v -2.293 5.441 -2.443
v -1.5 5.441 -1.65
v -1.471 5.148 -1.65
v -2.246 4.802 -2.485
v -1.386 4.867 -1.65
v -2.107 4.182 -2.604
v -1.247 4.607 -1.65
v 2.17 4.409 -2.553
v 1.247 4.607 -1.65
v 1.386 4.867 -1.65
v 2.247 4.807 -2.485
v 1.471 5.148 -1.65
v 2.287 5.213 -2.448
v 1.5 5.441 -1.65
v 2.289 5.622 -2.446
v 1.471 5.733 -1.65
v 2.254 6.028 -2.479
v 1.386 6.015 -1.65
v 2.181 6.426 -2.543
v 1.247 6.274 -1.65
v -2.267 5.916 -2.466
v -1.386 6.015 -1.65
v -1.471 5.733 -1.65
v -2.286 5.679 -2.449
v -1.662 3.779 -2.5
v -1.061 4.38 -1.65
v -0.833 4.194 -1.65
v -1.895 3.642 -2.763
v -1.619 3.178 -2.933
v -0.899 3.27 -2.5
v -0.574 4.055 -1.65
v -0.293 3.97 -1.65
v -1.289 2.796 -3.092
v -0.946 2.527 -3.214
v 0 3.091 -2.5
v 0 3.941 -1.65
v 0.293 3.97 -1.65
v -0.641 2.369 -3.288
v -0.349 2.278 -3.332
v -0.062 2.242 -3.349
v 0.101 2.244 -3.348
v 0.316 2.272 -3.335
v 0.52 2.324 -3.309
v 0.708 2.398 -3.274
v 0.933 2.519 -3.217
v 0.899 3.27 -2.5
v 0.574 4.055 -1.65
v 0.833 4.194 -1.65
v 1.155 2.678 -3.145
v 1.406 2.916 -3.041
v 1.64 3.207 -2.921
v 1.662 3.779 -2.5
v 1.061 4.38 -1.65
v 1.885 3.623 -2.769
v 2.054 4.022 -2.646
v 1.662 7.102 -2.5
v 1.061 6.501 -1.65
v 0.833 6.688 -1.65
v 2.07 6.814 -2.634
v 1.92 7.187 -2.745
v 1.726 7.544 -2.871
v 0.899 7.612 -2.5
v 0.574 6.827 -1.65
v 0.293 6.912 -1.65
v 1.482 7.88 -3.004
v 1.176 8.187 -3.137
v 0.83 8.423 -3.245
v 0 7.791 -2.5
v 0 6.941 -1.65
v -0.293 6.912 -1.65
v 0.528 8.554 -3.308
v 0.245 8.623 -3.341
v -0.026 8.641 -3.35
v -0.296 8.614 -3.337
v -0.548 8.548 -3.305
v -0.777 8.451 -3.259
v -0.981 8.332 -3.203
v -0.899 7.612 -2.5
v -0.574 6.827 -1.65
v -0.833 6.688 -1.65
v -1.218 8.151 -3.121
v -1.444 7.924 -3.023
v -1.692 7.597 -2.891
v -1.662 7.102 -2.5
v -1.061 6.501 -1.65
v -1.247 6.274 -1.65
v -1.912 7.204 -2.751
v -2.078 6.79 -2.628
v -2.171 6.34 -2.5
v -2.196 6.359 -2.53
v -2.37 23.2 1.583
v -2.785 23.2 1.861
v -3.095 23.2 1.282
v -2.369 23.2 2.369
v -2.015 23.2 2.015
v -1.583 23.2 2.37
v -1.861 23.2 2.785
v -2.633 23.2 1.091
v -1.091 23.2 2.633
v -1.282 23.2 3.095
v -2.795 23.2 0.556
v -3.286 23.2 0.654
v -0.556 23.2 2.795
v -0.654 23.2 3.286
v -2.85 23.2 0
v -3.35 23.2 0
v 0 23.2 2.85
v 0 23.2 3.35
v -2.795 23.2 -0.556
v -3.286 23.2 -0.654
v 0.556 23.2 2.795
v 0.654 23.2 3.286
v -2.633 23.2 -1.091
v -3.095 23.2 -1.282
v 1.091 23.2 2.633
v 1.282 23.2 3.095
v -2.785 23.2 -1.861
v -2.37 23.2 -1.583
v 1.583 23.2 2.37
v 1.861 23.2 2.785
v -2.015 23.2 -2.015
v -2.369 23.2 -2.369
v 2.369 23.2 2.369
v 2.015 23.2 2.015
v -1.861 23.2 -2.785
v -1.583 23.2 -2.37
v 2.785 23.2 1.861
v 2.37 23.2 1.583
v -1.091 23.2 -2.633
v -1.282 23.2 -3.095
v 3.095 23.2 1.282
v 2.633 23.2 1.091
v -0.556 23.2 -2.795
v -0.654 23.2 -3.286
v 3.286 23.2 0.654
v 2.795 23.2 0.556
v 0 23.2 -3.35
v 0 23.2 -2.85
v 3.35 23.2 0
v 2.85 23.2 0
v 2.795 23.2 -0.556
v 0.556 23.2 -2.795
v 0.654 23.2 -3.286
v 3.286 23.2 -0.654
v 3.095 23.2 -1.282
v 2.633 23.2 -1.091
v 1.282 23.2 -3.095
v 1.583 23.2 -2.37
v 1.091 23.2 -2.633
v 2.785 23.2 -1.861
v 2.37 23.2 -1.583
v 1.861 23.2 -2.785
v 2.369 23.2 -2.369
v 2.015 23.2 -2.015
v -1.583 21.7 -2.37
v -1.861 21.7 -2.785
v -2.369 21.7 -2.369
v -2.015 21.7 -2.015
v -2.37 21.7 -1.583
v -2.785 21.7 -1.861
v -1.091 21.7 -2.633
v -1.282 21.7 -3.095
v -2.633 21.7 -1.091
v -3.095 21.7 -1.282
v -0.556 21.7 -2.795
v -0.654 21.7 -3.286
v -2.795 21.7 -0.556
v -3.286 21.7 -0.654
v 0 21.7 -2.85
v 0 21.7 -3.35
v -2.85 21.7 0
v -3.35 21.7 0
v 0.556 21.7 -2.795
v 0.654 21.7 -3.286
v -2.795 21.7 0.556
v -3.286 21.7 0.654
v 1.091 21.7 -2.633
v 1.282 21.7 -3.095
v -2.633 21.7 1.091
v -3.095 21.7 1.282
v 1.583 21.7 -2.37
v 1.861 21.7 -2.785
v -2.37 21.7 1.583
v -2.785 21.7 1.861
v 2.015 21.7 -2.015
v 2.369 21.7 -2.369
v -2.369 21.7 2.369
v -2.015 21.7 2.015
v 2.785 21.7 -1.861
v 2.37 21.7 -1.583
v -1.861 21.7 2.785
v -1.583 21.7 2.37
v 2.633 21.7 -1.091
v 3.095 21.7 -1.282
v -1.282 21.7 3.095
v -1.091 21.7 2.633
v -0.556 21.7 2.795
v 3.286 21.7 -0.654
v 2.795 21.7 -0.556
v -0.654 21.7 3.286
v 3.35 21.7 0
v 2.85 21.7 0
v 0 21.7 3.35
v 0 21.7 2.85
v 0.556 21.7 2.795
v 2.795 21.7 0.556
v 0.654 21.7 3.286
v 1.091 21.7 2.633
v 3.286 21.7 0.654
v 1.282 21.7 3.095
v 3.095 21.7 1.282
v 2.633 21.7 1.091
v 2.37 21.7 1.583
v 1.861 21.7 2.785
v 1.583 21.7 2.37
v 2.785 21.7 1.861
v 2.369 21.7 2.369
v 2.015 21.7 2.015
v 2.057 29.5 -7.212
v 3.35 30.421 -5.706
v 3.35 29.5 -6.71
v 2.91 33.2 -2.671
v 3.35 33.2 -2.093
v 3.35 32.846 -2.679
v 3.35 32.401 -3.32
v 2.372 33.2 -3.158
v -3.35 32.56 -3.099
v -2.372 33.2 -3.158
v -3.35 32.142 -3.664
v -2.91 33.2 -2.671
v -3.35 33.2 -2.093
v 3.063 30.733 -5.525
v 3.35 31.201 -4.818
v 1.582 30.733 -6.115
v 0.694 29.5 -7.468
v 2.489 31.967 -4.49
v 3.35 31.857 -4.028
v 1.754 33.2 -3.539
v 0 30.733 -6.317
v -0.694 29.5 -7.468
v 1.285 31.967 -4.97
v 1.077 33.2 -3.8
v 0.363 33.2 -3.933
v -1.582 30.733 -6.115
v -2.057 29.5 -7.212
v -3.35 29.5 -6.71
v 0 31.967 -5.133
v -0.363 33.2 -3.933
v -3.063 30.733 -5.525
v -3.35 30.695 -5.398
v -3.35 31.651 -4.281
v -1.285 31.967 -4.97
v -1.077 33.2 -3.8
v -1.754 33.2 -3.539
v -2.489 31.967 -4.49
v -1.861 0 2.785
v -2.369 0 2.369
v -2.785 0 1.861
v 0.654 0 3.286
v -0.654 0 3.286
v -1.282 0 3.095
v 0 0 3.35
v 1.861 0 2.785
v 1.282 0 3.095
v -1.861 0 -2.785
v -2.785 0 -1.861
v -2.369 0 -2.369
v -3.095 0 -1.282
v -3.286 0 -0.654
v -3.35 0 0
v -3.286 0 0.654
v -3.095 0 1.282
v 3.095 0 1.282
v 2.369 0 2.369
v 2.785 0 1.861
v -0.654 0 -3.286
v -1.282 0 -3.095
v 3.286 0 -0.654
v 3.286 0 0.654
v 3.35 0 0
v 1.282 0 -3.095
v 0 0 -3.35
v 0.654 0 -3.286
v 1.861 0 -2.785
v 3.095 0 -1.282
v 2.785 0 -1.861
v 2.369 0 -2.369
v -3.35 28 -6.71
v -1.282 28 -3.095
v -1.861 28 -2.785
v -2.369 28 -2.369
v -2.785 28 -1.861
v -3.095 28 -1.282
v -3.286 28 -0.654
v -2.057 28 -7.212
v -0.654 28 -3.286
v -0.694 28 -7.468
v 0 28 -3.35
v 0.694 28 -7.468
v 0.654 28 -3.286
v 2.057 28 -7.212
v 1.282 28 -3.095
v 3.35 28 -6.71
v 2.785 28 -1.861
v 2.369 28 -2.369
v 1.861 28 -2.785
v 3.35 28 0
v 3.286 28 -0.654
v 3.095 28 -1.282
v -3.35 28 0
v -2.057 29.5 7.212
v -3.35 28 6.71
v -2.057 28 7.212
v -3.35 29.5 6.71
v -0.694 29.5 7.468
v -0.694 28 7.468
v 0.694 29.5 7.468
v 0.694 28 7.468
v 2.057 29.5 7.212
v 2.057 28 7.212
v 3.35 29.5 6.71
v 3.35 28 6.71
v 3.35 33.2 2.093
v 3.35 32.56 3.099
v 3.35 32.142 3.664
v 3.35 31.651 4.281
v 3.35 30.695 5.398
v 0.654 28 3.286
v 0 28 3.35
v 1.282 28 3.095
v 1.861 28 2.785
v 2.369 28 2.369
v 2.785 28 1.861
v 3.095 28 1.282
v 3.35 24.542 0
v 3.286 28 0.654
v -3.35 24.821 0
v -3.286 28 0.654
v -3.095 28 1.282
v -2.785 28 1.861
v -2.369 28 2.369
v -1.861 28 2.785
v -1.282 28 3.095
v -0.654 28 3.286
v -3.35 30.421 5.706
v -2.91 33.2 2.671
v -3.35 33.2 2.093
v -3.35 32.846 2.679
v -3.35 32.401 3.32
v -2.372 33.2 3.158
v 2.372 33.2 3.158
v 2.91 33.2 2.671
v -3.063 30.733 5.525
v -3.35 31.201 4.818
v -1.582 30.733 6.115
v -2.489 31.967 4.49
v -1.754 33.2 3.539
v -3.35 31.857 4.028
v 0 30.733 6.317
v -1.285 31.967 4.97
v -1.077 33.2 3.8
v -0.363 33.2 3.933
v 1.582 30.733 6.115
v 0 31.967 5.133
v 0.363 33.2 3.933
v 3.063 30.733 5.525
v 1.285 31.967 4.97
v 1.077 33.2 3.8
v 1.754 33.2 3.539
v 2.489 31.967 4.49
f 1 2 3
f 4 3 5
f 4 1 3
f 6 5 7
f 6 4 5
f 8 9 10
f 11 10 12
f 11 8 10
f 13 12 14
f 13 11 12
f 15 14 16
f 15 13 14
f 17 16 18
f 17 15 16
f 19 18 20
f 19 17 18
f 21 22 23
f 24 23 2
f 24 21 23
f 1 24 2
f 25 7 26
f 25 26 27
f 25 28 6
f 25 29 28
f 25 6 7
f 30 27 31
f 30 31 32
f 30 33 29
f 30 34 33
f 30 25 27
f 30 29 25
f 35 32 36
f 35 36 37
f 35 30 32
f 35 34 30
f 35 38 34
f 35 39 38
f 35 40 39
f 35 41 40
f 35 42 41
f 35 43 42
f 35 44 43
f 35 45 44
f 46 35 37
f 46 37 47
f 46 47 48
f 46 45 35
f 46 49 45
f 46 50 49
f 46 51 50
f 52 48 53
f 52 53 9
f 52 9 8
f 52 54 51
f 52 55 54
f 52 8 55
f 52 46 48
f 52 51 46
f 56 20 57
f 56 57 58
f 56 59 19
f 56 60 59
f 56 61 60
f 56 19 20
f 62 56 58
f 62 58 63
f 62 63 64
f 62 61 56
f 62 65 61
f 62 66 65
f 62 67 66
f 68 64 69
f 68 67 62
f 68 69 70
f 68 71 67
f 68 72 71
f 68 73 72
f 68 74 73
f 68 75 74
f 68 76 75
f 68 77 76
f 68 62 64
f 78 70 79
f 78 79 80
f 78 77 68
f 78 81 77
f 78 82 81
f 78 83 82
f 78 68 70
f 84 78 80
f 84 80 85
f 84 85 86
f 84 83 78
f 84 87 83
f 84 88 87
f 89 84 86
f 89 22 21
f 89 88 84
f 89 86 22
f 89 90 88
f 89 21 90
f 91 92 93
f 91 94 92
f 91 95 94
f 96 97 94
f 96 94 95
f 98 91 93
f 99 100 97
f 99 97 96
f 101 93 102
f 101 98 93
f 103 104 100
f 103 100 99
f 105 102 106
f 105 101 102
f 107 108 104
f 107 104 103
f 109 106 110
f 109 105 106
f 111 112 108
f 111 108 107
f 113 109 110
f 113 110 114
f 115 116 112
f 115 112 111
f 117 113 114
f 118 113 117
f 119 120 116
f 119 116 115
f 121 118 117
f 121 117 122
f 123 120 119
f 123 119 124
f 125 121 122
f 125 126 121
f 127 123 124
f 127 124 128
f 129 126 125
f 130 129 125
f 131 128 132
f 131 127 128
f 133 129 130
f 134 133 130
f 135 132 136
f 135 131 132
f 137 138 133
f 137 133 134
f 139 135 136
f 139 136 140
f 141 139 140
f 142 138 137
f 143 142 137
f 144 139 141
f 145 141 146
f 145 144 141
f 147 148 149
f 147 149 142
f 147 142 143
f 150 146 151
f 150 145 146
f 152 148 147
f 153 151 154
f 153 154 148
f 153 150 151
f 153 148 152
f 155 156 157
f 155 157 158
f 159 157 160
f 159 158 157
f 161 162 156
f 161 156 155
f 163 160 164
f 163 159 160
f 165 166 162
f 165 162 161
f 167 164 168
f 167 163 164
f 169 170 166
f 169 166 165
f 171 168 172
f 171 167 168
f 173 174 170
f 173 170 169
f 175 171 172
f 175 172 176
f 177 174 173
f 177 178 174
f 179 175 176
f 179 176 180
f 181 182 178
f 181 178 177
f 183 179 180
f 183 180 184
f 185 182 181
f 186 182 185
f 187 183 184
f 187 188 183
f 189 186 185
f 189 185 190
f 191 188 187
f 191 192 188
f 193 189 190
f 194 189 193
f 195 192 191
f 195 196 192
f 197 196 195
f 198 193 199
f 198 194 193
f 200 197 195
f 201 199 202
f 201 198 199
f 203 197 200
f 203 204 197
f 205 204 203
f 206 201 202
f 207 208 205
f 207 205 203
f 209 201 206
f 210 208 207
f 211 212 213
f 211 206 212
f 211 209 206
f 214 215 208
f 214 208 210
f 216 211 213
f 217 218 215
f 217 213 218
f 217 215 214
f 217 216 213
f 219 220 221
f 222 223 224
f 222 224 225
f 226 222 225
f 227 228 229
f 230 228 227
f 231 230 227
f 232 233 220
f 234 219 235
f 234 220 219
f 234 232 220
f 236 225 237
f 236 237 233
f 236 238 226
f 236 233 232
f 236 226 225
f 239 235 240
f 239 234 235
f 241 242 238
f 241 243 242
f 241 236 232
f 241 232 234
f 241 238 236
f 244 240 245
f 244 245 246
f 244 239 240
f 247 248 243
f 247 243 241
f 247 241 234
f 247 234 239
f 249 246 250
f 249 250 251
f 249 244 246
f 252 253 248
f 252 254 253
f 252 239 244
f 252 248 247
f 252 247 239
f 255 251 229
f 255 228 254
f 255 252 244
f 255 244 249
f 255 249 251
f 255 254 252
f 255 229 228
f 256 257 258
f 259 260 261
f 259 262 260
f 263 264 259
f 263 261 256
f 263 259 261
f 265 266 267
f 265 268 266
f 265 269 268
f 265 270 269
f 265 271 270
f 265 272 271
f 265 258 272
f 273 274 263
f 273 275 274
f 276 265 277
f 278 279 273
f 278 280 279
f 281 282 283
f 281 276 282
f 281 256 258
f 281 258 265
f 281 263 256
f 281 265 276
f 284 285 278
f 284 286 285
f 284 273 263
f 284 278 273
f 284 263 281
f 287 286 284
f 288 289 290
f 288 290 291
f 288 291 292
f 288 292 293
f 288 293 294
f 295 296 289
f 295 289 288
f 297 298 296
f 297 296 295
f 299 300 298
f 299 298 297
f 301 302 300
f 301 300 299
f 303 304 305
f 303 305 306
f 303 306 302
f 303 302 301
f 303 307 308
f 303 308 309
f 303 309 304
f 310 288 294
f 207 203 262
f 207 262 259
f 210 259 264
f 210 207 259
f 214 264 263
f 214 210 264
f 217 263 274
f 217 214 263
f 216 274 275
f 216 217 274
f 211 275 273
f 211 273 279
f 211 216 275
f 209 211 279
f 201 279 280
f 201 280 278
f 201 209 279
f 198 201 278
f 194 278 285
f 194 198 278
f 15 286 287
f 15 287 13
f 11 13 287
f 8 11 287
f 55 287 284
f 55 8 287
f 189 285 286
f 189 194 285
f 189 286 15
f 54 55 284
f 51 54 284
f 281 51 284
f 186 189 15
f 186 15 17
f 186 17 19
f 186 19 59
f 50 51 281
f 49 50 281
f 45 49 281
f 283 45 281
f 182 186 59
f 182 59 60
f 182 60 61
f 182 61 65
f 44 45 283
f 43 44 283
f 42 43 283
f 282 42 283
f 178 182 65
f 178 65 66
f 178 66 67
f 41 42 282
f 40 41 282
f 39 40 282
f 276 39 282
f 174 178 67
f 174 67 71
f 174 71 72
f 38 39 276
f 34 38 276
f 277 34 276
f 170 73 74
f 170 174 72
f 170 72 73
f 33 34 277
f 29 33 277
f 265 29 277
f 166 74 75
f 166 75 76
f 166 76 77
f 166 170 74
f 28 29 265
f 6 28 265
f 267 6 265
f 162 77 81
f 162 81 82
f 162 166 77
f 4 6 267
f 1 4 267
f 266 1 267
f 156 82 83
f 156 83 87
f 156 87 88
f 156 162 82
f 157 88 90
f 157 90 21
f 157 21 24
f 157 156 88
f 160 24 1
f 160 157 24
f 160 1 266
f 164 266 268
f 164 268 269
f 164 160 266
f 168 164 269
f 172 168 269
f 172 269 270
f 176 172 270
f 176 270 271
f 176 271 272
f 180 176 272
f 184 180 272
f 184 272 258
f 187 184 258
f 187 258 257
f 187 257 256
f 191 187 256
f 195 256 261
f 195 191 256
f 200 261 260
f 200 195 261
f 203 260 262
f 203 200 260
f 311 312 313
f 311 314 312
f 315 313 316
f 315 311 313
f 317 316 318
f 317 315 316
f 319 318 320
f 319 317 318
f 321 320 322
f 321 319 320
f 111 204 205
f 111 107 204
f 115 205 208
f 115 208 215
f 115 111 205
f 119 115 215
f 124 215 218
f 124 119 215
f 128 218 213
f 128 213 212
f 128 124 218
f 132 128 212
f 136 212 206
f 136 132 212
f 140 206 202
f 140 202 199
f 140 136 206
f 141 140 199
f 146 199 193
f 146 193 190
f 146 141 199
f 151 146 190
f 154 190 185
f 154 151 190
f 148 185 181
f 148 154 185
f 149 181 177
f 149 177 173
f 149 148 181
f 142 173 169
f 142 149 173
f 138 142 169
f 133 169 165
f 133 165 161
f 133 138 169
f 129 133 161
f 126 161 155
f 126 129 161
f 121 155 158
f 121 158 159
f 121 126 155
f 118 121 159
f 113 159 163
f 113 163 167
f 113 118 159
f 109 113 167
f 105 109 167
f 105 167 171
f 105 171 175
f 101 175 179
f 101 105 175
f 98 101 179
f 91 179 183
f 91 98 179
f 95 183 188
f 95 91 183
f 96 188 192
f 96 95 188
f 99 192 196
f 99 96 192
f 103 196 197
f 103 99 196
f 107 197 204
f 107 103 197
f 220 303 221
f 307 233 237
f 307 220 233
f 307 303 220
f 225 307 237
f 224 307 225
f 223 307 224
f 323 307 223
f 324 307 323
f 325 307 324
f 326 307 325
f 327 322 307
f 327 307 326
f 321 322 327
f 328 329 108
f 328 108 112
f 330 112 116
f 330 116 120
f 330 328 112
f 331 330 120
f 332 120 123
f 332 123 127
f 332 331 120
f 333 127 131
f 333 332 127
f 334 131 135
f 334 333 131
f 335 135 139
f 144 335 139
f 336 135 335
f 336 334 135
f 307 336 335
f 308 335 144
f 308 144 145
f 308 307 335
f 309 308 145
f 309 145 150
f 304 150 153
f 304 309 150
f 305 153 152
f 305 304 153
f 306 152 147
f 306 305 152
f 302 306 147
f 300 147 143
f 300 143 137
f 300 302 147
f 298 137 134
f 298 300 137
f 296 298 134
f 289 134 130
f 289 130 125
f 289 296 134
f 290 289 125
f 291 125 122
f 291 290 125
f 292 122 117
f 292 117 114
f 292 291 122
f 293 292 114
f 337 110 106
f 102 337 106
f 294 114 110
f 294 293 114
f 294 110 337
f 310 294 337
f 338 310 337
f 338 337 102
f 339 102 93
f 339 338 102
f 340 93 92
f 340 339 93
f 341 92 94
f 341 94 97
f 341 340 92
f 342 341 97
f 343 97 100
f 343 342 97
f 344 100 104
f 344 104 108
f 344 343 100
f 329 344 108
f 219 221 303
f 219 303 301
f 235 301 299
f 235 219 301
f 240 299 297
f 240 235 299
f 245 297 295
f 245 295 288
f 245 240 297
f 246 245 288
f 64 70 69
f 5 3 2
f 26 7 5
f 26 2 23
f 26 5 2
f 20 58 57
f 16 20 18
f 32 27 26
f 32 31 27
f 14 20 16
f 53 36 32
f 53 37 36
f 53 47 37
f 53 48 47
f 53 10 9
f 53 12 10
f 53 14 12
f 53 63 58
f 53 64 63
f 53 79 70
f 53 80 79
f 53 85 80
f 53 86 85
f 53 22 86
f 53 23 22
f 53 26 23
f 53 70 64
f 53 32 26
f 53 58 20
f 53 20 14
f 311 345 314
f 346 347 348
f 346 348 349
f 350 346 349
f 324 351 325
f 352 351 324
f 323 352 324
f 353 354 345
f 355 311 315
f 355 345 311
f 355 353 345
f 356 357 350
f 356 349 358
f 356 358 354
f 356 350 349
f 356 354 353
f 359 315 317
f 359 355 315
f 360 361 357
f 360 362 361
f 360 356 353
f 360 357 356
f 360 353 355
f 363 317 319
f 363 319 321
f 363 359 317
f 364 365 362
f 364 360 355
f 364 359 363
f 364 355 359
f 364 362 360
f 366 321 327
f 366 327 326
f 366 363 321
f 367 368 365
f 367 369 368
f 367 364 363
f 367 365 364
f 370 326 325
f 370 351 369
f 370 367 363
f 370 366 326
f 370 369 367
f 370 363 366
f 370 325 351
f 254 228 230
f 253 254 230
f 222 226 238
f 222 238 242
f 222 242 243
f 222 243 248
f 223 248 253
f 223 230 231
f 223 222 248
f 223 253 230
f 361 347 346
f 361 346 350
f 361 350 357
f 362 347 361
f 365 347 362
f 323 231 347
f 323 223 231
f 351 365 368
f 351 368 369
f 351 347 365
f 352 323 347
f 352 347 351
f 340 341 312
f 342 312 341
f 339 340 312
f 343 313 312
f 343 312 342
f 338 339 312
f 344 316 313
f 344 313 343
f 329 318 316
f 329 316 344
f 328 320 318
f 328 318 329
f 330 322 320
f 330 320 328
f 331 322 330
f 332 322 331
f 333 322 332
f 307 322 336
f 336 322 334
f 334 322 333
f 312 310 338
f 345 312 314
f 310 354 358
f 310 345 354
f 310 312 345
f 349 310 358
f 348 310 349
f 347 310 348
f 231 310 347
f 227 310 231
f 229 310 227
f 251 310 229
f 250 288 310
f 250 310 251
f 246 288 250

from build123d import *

# Parameters (mm, degrees)
SKETCH_3_W          = 7.345326746
SKETCH_3_H          = 8.819653772
SKETCH_3_W_2        = 8.702196558
SKETCH_3_H_2        = 9.976983905
CUT_EXTRUDE_1_DEPTH = 50


with BuildPart() as part:
    # 草图1 → 旋转1 (revolve)
    with BuildSketch(Plane.XY, mode=Mode.PRIVATE) as revolve_1_sk:
        Polygon((3.95, 33.2), (0, 33.2), (0, 0), (3.35, 0), (3.35, 21.7), (2.85, 21.7), (2.85, 23.2), (3.35, 23.2), (3.35, 28), (7.5, 28), (7.5, 29.5), align=None)
    revolve(revolve_1_sk.sketch.rotate(Axis((0, 33.2, 0), (0, 1, 0)), 270), axis=Axis((0, 33.2, 0), (0, 1, 0)))

    # 草图3 → 切除-拉伸1 (cut, symmetric)
    with BuildSketch(Plane.XY):
        with Locations((-7.022663373, 29.230861624)):
            Rectangle(SKETCH_3_W, SKETCH_3_H)
        with Locations((7.701098279, 29.530171142)):
            Rectangle(SKETCH_3_W_2, SKETCH_3_H_2)
    extrude(amount=CUT_EXTRUDE_1_DEPTH, both=True, mode=Mode.SUBTRACT)

    # 草图4 → 切除-旋转1 (revolve, cut)
    with BuildSketch(Plane(origin=(0, 0, 0), x_dir=(0, 0, -1), z_dir=(1, 0, 0)), mode=Mode.PRIVATE) as cut_revolve_1_sk:
        Polygon((3.35, 5.440830549), (1.65, 5.440830549), (1.65, 6.940830549), (3.35, 8.640830549), align=None)
    revolve(cut_revolve_1_sk.sketch.rotate(Axis((0, 5.440830549, -3.35), (0, 0, 1)), 90), axis=Axis((0, 5.440830549, -3.35), (0, 0, 1)), mode=Mode.SUBTRACT)


solid = part.part
